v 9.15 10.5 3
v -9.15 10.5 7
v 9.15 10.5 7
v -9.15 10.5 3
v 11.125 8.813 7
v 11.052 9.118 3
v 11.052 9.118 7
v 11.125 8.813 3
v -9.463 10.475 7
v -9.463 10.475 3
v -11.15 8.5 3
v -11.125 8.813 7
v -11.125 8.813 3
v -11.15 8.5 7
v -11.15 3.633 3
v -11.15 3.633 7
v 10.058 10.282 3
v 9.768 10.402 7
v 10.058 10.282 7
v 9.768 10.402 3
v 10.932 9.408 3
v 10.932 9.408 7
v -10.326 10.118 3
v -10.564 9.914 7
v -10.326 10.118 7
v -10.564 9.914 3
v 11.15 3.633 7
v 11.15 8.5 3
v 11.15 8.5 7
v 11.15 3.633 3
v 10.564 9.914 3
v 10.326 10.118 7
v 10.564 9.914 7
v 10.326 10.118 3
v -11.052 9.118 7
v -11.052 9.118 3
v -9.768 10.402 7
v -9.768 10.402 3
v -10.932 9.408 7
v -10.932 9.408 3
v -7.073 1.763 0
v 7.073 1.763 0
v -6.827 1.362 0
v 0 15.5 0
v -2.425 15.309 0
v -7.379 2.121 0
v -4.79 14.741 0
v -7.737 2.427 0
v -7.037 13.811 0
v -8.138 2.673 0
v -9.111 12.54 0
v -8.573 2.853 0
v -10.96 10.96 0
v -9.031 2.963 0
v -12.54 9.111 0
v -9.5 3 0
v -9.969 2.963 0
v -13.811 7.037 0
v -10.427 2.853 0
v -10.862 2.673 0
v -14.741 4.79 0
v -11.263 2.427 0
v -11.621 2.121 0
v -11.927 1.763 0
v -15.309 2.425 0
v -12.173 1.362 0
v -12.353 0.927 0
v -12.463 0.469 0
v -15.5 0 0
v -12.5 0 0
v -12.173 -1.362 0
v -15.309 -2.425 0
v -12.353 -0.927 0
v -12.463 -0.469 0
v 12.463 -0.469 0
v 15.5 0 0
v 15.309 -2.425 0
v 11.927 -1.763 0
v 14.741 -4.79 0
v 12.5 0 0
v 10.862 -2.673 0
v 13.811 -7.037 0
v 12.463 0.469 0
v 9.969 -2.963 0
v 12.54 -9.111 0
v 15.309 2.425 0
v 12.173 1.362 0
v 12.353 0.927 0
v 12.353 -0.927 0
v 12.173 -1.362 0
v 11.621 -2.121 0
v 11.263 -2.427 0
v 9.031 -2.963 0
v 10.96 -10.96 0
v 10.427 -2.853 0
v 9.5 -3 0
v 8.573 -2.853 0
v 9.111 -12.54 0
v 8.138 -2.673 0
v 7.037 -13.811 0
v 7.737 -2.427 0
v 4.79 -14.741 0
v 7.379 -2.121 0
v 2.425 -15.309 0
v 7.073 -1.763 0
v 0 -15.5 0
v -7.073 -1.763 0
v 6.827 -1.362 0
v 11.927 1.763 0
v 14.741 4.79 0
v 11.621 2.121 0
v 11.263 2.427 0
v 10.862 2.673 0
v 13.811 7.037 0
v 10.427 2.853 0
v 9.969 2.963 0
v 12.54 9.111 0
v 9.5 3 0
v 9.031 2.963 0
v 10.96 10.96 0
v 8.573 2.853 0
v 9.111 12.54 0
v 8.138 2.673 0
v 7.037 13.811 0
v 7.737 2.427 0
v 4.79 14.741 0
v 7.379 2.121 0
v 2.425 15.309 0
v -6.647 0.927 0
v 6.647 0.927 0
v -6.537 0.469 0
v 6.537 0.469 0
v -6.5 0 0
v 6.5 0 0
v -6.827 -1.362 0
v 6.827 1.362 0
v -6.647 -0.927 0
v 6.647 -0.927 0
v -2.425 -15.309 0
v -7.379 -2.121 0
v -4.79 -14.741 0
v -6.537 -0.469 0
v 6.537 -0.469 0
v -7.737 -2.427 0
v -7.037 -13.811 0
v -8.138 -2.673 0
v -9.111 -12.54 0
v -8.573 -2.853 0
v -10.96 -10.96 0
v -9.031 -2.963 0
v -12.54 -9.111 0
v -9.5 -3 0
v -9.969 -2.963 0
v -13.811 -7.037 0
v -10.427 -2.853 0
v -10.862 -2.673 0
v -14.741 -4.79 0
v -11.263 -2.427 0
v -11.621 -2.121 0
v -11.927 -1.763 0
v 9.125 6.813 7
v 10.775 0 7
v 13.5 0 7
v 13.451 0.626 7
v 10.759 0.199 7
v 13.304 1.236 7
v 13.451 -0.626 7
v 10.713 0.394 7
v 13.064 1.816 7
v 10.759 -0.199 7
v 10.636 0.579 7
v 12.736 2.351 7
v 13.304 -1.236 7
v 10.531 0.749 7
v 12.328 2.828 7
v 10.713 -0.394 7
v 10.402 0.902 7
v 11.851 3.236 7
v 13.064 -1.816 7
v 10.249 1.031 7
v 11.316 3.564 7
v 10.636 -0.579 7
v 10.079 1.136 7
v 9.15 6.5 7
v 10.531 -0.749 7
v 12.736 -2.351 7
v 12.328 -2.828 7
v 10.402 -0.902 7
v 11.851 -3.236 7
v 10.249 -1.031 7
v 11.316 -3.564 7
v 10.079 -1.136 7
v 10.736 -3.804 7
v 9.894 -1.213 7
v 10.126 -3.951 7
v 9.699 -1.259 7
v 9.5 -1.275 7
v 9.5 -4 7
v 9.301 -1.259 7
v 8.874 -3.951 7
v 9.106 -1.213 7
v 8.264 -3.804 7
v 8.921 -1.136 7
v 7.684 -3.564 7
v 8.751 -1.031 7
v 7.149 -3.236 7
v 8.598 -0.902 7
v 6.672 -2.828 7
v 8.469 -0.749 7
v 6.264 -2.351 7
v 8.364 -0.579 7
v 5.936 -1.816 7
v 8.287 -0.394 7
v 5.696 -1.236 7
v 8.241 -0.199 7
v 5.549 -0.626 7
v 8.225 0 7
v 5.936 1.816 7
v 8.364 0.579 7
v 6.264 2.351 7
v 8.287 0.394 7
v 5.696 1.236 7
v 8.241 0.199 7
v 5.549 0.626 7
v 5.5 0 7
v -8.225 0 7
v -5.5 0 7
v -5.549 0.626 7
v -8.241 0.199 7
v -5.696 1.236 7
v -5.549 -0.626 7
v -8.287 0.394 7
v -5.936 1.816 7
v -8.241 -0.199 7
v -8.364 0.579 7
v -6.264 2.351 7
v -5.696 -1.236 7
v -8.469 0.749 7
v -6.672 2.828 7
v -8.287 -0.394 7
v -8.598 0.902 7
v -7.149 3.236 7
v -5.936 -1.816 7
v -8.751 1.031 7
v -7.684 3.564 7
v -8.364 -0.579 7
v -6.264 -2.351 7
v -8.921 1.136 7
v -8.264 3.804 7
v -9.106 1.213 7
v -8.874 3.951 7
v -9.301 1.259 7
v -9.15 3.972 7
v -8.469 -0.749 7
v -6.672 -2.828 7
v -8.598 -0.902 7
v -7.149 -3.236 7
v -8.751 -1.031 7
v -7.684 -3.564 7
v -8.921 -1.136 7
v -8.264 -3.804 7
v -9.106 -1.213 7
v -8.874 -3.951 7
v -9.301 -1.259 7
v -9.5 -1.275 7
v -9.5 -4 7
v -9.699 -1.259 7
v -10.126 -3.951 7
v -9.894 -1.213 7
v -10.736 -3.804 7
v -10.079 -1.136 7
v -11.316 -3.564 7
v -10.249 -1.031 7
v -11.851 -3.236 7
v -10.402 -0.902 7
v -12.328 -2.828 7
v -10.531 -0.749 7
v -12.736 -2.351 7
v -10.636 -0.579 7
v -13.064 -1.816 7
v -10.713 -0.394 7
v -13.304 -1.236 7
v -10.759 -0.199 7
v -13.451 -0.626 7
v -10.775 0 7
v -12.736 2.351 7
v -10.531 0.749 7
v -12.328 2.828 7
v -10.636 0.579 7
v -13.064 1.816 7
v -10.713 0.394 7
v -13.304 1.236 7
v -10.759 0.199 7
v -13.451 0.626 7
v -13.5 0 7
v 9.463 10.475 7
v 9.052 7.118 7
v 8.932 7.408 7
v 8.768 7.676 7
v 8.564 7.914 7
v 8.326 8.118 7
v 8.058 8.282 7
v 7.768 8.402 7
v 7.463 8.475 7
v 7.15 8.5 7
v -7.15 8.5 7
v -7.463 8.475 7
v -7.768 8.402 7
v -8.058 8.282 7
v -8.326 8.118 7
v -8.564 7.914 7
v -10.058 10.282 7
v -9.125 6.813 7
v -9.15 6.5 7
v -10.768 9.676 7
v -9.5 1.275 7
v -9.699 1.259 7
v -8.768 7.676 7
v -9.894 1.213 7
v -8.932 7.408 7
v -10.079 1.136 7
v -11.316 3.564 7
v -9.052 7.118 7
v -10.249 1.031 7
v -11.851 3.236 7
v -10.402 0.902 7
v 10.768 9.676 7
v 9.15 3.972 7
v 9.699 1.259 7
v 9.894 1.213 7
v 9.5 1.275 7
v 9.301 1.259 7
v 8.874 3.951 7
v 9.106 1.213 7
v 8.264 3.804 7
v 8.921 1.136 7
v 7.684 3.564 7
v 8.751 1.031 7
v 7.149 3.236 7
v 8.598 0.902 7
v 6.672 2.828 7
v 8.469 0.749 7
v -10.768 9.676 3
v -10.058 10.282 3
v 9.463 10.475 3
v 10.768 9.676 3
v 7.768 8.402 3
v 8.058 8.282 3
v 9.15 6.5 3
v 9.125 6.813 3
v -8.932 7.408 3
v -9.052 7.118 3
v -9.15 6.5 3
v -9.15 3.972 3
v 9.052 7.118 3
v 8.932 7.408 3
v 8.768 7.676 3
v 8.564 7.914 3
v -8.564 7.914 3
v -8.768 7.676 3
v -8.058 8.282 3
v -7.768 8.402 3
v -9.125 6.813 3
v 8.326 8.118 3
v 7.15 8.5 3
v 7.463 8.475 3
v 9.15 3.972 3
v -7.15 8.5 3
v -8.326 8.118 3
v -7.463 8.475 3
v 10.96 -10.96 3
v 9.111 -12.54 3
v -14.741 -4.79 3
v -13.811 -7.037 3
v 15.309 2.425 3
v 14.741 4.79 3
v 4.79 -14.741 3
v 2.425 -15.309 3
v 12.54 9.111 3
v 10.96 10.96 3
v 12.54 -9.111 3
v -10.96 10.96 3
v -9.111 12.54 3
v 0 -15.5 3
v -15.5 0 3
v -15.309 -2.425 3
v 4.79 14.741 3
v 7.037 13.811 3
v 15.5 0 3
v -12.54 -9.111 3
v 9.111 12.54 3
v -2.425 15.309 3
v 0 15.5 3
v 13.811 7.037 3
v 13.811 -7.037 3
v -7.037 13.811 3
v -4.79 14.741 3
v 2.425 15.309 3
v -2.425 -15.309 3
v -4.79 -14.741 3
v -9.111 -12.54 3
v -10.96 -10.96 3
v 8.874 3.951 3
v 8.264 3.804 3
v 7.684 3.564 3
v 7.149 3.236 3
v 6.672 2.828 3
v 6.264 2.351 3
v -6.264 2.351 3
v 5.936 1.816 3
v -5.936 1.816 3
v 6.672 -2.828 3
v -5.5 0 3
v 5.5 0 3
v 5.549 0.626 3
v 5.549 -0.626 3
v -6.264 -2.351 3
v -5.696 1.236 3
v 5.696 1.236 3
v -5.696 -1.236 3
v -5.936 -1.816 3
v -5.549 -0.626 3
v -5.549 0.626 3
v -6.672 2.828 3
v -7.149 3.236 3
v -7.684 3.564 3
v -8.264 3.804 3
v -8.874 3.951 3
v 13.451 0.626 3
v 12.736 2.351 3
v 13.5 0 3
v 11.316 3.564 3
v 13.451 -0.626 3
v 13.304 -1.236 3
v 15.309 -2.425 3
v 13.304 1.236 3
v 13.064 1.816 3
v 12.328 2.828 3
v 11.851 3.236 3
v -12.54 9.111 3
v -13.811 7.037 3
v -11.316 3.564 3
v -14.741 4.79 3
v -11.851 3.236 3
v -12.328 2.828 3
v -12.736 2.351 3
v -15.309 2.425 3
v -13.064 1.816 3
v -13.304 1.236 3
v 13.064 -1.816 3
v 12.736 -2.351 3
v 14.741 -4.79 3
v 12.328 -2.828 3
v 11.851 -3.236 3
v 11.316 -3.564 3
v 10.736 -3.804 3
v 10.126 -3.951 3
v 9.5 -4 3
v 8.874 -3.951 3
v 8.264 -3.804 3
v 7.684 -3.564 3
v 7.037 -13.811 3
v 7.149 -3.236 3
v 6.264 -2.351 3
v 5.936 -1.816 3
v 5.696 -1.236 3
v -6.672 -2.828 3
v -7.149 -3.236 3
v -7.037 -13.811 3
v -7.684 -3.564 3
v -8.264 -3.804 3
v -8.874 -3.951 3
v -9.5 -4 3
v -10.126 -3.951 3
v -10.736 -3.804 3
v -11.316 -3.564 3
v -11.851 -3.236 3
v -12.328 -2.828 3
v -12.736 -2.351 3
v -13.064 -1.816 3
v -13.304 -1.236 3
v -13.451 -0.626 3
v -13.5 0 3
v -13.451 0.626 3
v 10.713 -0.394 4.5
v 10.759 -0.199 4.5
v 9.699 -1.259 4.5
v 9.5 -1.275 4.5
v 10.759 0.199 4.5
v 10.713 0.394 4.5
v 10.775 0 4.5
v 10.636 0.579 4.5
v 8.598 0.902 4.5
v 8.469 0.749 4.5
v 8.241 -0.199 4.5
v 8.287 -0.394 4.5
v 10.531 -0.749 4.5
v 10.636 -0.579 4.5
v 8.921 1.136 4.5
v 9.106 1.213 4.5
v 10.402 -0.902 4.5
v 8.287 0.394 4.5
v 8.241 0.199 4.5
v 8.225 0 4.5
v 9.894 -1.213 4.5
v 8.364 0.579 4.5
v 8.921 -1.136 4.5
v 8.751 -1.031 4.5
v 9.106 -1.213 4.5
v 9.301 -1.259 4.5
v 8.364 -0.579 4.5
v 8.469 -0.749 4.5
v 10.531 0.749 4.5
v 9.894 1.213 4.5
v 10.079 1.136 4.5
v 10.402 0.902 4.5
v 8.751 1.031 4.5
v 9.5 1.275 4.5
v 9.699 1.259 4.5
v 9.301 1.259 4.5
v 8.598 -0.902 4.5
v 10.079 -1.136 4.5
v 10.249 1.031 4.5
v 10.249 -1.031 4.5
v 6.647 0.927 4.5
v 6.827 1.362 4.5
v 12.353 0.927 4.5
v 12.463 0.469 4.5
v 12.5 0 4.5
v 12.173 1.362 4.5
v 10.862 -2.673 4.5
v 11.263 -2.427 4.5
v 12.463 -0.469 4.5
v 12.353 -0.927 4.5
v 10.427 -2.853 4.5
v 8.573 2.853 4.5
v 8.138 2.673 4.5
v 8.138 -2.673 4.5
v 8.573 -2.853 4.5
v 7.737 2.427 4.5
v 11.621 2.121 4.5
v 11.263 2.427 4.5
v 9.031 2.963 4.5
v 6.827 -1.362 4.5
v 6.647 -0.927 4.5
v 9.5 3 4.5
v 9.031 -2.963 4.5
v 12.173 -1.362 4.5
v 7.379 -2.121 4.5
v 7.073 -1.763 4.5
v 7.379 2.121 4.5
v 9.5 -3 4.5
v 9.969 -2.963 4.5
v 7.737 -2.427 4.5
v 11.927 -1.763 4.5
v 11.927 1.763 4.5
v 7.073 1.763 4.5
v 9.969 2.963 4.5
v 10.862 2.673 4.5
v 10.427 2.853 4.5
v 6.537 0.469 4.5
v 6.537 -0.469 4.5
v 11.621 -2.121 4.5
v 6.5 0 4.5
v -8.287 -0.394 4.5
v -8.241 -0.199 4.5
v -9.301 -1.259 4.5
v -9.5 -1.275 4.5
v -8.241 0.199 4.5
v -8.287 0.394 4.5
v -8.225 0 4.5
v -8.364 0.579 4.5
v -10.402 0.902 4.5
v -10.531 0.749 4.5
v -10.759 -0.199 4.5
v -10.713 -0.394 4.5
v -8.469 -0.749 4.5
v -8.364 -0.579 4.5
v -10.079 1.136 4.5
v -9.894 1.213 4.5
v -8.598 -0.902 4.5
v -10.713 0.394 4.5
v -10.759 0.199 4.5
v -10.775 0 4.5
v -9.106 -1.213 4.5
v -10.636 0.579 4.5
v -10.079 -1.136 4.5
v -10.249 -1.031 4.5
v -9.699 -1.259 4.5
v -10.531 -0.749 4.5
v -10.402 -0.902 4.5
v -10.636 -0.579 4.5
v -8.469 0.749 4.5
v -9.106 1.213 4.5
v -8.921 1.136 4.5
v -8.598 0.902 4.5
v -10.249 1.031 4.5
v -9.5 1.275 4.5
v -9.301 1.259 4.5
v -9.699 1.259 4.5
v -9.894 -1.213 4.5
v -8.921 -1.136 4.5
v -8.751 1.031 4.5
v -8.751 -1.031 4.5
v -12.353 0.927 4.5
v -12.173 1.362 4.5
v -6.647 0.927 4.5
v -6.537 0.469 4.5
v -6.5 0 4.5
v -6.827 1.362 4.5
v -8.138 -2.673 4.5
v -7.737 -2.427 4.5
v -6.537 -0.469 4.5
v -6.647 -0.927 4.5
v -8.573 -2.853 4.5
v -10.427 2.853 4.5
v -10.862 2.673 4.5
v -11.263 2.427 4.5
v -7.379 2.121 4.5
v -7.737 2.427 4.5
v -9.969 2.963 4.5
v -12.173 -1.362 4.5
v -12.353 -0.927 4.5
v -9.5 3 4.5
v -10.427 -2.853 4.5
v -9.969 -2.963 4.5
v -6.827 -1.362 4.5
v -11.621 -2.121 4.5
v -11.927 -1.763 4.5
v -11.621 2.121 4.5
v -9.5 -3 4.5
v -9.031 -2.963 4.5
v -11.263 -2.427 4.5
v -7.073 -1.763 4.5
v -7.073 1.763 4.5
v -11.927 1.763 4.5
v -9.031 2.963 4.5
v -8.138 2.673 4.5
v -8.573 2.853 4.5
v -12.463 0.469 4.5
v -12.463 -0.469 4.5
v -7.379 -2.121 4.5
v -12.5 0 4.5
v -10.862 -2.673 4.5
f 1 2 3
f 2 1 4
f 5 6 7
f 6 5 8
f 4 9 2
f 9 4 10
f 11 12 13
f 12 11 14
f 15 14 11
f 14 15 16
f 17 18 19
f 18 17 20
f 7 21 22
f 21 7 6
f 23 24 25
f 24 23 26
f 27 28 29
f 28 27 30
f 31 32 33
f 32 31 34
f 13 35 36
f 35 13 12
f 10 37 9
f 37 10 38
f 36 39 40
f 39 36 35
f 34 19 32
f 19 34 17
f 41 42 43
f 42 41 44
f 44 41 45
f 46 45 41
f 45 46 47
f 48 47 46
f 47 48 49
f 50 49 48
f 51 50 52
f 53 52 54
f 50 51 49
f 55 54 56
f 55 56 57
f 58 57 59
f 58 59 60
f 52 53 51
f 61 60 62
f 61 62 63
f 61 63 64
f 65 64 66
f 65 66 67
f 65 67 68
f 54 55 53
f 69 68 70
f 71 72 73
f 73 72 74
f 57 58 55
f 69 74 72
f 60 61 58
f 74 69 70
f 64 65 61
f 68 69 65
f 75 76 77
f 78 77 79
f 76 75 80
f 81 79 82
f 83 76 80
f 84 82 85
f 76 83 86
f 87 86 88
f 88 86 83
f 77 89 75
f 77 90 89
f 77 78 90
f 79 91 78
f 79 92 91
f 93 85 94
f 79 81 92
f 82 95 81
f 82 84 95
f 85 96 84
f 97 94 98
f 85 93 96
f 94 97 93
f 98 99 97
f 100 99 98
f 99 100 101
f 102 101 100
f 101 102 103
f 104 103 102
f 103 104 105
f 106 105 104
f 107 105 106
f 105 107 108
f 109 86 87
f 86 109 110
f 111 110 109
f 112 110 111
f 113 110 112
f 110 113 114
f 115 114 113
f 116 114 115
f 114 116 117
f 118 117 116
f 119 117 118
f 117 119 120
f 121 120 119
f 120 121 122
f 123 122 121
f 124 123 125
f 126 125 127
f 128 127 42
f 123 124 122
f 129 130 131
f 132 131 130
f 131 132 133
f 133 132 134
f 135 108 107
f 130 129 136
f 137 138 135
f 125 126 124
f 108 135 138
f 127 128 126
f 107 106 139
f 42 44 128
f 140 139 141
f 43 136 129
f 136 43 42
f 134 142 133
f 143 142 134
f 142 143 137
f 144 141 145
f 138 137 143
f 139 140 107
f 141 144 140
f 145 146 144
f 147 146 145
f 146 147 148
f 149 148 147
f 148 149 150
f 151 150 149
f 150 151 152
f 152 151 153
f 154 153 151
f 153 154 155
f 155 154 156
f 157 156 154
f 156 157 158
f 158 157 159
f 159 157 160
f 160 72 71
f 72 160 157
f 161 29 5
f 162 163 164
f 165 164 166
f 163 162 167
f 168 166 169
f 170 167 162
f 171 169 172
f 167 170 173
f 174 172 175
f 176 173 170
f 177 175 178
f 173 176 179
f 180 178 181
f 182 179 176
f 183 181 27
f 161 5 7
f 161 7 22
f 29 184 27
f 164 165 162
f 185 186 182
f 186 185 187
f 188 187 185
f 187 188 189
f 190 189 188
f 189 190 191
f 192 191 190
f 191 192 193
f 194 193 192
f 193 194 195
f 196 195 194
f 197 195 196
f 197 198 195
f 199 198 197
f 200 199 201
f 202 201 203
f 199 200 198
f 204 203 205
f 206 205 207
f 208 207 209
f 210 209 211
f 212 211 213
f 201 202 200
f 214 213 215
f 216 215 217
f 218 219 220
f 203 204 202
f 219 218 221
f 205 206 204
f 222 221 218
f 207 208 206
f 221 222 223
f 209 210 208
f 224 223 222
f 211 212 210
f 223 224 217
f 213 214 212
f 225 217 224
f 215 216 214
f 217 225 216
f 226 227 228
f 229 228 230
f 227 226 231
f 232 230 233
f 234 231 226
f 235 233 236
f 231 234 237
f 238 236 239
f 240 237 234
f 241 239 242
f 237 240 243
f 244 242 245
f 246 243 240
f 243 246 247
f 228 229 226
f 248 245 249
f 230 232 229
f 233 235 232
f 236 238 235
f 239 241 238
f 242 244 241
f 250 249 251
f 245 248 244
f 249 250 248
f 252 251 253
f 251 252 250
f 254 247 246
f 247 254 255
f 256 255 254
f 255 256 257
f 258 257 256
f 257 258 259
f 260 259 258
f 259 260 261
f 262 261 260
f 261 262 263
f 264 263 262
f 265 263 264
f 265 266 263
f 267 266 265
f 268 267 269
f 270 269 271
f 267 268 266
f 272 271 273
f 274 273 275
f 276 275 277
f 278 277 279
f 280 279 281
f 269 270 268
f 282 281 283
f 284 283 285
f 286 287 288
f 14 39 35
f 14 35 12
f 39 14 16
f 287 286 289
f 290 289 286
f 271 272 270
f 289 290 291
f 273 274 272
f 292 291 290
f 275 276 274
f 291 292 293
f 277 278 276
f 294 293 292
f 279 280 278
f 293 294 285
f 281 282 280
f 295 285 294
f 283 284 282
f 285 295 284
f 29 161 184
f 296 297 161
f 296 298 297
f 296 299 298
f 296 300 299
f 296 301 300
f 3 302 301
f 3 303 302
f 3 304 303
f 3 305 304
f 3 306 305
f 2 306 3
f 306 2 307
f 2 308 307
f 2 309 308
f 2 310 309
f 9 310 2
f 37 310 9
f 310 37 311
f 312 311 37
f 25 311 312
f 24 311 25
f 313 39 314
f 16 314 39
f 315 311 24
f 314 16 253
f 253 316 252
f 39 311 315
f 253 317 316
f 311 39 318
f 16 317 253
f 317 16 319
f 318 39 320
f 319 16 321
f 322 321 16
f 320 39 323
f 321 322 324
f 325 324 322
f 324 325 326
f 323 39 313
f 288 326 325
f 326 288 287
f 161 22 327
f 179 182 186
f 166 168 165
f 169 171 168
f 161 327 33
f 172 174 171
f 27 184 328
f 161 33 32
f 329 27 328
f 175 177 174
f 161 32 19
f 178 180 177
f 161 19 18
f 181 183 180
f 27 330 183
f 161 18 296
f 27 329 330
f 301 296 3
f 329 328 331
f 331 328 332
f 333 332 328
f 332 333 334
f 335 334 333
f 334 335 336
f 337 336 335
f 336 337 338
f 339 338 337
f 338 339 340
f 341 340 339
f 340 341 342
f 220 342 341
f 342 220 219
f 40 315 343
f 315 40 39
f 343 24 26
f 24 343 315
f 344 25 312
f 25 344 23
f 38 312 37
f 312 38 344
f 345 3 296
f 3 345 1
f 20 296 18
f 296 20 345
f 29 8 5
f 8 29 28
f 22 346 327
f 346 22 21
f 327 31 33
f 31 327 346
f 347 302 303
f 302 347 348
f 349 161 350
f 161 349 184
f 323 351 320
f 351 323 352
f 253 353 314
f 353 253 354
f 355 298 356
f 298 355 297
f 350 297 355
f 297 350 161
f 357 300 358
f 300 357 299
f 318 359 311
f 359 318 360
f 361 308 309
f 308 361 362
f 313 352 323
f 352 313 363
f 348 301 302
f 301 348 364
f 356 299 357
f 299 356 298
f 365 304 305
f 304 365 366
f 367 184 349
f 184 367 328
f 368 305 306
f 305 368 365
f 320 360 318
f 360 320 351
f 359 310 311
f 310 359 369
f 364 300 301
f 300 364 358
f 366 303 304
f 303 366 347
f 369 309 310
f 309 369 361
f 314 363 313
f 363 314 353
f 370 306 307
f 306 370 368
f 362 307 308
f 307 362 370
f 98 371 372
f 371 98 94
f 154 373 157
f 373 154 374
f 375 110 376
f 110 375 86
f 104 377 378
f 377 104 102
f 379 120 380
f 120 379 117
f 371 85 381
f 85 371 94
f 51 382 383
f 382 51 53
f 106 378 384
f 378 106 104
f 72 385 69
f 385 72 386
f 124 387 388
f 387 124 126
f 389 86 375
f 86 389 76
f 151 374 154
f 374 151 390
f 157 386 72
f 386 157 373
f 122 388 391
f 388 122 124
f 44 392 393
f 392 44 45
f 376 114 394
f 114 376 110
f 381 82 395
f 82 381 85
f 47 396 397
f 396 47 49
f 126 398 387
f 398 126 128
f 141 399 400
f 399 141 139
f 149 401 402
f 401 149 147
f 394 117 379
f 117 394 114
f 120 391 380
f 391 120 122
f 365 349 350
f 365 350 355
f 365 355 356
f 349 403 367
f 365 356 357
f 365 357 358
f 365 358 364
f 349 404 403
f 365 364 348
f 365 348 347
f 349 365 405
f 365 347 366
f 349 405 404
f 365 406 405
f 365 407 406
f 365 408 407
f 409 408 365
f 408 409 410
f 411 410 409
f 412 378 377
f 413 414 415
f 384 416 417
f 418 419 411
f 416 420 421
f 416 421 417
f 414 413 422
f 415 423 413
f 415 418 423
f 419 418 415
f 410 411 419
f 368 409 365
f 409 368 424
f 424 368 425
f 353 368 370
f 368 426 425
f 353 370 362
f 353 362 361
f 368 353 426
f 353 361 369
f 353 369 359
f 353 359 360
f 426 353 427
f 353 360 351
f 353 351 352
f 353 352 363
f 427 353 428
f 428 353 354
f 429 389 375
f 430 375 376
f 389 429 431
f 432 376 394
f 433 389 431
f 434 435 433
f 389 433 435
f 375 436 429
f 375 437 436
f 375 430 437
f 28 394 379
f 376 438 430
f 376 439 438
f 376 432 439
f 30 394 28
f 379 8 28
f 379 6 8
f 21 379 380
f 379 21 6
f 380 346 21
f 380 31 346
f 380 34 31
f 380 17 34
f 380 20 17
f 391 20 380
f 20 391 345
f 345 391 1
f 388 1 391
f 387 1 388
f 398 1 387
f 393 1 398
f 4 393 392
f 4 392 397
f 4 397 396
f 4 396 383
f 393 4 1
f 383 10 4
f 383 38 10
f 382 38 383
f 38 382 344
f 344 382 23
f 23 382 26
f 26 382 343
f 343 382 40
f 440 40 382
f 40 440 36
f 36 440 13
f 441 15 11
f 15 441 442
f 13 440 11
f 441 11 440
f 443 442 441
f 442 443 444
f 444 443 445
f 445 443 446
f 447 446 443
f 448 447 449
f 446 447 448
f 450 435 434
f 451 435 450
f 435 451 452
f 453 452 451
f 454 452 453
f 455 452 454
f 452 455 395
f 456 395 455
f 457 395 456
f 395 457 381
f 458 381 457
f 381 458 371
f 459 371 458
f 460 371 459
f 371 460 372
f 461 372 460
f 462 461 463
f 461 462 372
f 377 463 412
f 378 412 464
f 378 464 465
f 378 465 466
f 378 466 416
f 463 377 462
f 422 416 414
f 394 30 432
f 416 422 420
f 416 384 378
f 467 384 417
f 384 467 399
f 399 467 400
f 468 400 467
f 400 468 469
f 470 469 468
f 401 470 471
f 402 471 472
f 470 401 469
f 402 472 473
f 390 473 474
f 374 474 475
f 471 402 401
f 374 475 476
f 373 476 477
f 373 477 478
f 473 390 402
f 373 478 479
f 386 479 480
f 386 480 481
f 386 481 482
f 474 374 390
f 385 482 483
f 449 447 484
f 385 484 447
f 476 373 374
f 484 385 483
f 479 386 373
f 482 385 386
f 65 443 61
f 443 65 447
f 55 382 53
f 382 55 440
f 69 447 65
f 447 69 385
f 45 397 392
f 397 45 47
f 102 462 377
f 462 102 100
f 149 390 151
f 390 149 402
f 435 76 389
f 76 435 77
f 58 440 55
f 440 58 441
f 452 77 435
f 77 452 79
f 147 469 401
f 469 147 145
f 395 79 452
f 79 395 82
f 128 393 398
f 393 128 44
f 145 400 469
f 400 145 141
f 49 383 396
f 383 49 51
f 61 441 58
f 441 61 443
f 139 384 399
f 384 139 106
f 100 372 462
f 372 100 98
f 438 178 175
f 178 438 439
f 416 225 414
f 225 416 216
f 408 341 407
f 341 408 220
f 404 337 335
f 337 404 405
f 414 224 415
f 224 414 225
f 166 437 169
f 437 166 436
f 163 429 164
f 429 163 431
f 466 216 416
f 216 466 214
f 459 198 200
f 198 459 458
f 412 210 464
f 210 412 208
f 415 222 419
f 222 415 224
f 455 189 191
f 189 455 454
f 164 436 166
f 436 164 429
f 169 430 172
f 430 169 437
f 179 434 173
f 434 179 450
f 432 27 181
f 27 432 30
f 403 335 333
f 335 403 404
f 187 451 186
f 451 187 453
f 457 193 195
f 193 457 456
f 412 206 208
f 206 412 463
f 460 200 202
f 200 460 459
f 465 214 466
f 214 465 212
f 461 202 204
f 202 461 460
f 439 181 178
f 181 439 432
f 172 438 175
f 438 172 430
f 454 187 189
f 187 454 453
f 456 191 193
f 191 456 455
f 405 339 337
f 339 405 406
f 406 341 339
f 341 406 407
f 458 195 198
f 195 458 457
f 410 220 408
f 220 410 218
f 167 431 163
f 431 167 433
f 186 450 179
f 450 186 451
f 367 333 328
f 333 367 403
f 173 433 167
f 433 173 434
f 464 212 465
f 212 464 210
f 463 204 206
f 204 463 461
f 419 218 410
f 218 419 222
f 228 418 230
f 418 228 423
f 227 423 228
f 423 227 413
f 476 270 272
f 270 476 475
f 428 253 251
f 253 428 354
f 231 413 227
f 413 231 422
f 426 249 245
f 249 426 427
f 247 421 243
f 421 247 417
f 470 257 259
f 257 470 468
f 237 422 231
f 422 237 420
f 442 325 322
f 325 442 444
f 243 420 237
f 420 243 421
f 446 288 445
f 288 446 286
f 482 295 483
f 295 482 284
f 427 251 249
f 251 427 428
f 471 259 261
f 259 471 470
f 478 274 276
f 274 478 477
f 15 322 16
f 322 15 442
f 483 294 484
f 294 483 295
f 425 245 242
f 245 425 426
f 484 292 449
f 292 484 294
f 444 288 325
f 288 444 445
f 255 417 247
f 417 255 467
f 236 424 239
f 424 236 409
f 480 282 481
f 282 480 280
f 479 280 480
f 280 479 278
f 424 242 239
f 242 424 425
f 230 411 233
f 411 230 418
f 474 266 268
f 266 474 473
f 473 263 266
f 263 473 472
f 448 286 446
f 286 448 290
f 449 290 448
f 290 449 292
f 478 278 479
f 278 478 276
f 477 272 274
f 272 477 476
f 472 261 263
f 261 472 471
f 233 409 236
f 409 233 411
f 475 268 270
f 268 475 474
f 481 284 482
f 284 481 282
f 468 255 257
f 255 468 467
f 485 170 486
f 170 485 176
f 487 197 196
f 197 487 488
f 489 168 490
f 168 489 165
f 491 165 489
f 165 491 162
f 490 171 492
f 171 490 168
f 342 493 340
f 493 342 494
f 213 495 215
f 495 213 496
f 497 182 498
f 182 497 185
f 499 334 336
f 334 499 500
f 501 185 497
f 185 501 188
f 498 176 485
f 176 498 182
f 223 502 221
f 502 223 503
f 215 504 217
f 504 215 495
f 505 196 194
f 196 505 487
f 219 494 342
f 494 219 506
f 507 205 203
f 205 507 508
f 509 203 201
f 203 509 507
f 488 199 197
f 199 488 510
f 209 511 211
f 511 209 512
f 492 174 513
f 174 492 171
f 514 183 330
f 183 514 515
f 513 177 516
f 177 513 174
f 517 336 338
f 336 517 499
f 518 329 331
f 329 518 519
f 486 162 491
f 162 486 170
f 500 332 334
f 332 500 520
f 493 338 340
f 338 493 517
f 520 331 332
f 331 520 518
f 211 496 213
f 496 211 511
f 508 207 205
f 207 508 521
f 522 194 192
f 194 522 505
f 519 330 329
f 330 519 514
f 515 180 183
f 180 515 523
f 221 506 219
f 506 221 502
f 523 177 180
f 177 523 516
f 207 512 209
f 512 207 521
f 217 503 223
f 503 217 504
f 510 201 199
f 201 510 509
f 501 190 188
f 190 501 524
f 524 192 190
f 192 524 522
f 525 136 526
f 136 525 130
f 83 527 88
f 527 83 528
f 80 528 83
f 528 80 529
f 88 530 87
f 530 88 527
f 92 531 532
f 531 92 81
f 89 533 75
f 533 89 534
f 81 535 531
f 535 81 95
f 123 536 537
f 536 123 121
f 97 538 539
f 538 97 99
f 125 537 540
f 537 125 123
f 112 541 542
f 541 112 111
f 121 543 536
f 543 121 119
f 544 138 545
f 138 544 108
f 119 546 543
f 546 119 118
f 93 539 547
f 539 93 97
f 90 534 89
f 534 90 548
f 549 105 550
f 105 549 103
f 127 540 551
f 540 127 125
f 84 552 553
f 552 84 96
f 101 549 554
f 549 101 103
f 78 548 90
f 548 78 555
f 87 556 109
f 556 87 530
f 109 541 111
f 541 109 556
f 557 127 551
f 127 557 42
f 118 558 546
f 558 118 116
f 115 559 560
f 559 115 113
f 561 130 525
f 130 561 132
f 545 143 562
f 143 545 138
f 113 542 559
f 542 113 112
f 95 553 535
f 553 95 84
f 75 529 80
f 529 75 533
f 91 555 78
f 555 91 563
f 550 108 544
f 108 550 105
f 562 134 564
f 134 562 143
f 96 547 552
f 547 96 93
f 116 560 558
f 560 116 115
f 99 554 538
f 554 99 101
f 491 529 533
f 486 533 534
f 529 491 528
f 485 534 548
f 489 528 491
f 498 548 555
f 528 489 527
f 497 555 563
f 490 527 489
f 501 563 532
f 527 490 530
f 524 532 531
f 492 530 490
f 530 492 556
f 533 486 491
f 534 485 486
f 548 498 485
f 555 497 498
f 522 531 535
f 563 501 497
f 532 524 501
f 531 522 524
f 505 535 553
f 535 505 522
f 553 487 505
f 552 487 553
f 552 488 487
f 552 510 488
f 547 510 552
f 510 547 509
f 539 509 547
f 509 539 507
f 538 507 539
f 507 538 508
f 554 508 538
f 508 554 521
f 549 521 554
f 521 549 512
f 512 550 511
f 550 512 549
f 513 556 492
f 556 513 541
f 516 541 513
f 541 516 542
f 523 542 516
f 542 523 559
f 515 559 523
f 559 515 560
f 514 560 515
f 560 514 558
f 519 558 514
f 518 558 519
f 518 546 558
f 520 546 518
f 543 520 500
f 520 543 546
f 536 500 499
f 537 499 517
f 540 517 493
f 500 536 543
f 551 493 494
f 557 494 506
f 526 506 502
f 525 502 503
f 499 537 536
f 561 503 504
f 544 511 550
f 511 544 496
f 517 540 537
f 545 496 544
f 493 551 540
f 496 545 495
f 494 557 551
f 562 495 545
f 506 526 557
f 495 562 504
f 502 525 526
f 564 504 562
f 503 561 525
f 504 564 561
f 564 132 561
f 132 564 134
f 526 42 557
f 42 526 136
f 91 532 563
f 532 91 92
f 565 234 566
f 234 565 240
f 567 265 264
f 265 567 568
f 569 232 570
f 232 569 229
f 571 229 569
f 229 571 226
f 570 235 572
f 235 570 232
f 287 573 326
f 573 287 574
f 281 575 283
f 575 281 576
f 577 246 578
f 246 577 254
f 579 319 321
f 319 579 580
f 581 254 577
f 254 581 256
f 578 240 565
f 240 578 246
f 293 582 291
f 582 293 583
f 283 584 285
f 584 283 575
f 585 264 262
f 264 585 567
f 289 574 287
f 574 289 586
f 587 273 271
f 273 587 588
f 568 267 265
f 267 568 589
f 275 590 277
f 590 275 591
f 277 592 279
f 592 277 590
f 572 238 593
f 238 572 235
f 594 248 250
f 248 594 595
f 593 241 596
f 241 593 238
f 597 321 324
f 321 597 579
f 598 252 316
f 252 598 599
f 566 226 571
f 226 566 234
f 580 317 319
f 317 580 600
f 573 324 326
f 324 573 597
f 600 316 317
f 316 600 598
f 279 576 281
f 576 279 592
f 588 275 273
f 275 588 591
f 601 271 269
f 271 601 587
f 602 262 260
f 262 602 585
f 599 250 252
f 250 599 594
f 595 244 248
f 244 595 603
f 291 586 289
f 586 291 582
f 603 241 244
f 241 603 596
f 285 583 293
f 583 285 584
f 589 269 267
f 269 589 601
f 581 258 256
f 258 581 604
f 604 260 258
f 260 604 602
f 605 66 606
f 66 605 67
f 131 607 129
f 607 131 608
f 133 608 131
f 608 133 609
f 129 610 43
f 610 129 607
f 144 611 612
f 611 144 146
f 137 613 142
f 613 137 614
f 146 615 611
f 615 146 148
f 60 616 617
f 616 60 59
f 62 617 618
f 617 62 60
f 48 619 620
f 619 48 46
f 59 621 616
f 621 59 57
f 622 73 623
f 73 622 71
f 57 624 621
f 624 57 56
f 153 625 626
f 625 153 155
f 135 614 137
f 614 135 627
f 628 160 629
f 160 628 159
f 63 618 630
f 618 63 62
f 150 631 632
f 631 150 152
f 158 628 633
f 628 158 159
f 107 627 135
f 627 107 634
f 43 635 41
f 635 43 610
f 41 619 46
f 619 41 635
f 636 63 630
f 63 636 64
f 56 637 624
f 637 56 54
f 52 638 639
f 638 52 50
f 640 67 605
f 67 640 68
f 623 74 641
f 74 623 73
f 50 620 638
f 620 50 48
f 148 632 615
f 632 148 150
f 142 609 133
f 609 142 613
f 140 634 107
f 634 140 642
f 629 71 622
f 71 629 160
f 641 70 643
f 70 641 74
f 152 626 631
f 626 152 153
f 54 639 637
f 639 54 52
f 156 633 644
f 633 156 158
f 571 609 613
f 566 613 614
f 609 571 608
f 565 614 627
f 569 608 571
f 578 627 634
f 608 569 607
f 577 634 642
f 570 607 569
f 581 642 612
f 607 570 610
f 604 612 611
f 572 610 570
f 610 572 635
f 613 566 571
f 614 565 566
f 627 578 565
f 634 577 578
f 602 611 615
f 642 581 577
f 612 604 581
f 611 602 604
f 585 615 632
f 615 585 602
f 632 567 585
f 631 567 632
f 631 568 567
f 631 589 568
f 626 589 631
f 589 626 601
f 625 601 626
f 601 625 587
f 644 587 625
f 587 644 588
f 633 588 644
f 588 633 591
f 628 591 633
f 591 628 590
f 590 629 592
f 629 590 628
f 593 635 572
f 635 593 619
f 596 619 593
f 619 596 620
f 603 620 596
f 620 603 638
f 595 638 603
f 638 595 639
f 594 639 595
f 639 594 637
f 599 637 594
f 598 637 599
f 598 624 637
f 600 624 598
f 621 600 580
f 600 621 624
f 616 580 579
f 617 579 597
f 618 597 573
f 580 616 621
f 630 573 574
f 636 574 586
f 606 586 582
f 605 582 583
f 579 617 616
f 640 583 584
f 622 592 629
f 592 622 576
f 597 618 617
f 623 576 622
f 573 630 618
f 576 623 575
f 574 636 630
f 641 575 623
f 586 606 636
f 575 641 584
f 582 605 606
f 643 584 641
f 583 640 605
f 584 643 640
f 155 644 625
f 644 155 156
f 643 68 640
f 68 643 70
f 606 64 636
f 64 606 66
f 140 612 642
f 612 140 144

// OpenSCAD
$fn=40;

difference () {
    union() {
        cylinder(r=31/2, h=3);

        difference() {
            translate([(-22.3+4)/2, 0, 0]) {
                minkowski() {
                    cube([22.3-4, 12.5-4, 7-1]);
                    cylinder(r=2, h=1);
                }
            }
            translate([(-18.3+4)/2, 0, 0]) {
                minkowski() {
                    cube([18.3-4, 10.5-4, 7-1]);
                    cylinder(r=2, h=1);
                }
            }
        }
        translate([19/2, 0, 0]) {
            cylinder(r=4, h=7);
        }
        translate([-19/2, 0, 0]) {
            cylinder(r=4, h=7);
        }
    }
    union() {
        translate([19/2, 0, 0]) {
            cylinder(r=2.55/2, h=7);
            cylinder(r=6/2, h=4.5);
        }
        translate([-19/2, 0, 0]) {
            cylinder(r=2.55/2, h=7);
            cylinder(r=6/2, h=4.5);
        }    
    }
}
